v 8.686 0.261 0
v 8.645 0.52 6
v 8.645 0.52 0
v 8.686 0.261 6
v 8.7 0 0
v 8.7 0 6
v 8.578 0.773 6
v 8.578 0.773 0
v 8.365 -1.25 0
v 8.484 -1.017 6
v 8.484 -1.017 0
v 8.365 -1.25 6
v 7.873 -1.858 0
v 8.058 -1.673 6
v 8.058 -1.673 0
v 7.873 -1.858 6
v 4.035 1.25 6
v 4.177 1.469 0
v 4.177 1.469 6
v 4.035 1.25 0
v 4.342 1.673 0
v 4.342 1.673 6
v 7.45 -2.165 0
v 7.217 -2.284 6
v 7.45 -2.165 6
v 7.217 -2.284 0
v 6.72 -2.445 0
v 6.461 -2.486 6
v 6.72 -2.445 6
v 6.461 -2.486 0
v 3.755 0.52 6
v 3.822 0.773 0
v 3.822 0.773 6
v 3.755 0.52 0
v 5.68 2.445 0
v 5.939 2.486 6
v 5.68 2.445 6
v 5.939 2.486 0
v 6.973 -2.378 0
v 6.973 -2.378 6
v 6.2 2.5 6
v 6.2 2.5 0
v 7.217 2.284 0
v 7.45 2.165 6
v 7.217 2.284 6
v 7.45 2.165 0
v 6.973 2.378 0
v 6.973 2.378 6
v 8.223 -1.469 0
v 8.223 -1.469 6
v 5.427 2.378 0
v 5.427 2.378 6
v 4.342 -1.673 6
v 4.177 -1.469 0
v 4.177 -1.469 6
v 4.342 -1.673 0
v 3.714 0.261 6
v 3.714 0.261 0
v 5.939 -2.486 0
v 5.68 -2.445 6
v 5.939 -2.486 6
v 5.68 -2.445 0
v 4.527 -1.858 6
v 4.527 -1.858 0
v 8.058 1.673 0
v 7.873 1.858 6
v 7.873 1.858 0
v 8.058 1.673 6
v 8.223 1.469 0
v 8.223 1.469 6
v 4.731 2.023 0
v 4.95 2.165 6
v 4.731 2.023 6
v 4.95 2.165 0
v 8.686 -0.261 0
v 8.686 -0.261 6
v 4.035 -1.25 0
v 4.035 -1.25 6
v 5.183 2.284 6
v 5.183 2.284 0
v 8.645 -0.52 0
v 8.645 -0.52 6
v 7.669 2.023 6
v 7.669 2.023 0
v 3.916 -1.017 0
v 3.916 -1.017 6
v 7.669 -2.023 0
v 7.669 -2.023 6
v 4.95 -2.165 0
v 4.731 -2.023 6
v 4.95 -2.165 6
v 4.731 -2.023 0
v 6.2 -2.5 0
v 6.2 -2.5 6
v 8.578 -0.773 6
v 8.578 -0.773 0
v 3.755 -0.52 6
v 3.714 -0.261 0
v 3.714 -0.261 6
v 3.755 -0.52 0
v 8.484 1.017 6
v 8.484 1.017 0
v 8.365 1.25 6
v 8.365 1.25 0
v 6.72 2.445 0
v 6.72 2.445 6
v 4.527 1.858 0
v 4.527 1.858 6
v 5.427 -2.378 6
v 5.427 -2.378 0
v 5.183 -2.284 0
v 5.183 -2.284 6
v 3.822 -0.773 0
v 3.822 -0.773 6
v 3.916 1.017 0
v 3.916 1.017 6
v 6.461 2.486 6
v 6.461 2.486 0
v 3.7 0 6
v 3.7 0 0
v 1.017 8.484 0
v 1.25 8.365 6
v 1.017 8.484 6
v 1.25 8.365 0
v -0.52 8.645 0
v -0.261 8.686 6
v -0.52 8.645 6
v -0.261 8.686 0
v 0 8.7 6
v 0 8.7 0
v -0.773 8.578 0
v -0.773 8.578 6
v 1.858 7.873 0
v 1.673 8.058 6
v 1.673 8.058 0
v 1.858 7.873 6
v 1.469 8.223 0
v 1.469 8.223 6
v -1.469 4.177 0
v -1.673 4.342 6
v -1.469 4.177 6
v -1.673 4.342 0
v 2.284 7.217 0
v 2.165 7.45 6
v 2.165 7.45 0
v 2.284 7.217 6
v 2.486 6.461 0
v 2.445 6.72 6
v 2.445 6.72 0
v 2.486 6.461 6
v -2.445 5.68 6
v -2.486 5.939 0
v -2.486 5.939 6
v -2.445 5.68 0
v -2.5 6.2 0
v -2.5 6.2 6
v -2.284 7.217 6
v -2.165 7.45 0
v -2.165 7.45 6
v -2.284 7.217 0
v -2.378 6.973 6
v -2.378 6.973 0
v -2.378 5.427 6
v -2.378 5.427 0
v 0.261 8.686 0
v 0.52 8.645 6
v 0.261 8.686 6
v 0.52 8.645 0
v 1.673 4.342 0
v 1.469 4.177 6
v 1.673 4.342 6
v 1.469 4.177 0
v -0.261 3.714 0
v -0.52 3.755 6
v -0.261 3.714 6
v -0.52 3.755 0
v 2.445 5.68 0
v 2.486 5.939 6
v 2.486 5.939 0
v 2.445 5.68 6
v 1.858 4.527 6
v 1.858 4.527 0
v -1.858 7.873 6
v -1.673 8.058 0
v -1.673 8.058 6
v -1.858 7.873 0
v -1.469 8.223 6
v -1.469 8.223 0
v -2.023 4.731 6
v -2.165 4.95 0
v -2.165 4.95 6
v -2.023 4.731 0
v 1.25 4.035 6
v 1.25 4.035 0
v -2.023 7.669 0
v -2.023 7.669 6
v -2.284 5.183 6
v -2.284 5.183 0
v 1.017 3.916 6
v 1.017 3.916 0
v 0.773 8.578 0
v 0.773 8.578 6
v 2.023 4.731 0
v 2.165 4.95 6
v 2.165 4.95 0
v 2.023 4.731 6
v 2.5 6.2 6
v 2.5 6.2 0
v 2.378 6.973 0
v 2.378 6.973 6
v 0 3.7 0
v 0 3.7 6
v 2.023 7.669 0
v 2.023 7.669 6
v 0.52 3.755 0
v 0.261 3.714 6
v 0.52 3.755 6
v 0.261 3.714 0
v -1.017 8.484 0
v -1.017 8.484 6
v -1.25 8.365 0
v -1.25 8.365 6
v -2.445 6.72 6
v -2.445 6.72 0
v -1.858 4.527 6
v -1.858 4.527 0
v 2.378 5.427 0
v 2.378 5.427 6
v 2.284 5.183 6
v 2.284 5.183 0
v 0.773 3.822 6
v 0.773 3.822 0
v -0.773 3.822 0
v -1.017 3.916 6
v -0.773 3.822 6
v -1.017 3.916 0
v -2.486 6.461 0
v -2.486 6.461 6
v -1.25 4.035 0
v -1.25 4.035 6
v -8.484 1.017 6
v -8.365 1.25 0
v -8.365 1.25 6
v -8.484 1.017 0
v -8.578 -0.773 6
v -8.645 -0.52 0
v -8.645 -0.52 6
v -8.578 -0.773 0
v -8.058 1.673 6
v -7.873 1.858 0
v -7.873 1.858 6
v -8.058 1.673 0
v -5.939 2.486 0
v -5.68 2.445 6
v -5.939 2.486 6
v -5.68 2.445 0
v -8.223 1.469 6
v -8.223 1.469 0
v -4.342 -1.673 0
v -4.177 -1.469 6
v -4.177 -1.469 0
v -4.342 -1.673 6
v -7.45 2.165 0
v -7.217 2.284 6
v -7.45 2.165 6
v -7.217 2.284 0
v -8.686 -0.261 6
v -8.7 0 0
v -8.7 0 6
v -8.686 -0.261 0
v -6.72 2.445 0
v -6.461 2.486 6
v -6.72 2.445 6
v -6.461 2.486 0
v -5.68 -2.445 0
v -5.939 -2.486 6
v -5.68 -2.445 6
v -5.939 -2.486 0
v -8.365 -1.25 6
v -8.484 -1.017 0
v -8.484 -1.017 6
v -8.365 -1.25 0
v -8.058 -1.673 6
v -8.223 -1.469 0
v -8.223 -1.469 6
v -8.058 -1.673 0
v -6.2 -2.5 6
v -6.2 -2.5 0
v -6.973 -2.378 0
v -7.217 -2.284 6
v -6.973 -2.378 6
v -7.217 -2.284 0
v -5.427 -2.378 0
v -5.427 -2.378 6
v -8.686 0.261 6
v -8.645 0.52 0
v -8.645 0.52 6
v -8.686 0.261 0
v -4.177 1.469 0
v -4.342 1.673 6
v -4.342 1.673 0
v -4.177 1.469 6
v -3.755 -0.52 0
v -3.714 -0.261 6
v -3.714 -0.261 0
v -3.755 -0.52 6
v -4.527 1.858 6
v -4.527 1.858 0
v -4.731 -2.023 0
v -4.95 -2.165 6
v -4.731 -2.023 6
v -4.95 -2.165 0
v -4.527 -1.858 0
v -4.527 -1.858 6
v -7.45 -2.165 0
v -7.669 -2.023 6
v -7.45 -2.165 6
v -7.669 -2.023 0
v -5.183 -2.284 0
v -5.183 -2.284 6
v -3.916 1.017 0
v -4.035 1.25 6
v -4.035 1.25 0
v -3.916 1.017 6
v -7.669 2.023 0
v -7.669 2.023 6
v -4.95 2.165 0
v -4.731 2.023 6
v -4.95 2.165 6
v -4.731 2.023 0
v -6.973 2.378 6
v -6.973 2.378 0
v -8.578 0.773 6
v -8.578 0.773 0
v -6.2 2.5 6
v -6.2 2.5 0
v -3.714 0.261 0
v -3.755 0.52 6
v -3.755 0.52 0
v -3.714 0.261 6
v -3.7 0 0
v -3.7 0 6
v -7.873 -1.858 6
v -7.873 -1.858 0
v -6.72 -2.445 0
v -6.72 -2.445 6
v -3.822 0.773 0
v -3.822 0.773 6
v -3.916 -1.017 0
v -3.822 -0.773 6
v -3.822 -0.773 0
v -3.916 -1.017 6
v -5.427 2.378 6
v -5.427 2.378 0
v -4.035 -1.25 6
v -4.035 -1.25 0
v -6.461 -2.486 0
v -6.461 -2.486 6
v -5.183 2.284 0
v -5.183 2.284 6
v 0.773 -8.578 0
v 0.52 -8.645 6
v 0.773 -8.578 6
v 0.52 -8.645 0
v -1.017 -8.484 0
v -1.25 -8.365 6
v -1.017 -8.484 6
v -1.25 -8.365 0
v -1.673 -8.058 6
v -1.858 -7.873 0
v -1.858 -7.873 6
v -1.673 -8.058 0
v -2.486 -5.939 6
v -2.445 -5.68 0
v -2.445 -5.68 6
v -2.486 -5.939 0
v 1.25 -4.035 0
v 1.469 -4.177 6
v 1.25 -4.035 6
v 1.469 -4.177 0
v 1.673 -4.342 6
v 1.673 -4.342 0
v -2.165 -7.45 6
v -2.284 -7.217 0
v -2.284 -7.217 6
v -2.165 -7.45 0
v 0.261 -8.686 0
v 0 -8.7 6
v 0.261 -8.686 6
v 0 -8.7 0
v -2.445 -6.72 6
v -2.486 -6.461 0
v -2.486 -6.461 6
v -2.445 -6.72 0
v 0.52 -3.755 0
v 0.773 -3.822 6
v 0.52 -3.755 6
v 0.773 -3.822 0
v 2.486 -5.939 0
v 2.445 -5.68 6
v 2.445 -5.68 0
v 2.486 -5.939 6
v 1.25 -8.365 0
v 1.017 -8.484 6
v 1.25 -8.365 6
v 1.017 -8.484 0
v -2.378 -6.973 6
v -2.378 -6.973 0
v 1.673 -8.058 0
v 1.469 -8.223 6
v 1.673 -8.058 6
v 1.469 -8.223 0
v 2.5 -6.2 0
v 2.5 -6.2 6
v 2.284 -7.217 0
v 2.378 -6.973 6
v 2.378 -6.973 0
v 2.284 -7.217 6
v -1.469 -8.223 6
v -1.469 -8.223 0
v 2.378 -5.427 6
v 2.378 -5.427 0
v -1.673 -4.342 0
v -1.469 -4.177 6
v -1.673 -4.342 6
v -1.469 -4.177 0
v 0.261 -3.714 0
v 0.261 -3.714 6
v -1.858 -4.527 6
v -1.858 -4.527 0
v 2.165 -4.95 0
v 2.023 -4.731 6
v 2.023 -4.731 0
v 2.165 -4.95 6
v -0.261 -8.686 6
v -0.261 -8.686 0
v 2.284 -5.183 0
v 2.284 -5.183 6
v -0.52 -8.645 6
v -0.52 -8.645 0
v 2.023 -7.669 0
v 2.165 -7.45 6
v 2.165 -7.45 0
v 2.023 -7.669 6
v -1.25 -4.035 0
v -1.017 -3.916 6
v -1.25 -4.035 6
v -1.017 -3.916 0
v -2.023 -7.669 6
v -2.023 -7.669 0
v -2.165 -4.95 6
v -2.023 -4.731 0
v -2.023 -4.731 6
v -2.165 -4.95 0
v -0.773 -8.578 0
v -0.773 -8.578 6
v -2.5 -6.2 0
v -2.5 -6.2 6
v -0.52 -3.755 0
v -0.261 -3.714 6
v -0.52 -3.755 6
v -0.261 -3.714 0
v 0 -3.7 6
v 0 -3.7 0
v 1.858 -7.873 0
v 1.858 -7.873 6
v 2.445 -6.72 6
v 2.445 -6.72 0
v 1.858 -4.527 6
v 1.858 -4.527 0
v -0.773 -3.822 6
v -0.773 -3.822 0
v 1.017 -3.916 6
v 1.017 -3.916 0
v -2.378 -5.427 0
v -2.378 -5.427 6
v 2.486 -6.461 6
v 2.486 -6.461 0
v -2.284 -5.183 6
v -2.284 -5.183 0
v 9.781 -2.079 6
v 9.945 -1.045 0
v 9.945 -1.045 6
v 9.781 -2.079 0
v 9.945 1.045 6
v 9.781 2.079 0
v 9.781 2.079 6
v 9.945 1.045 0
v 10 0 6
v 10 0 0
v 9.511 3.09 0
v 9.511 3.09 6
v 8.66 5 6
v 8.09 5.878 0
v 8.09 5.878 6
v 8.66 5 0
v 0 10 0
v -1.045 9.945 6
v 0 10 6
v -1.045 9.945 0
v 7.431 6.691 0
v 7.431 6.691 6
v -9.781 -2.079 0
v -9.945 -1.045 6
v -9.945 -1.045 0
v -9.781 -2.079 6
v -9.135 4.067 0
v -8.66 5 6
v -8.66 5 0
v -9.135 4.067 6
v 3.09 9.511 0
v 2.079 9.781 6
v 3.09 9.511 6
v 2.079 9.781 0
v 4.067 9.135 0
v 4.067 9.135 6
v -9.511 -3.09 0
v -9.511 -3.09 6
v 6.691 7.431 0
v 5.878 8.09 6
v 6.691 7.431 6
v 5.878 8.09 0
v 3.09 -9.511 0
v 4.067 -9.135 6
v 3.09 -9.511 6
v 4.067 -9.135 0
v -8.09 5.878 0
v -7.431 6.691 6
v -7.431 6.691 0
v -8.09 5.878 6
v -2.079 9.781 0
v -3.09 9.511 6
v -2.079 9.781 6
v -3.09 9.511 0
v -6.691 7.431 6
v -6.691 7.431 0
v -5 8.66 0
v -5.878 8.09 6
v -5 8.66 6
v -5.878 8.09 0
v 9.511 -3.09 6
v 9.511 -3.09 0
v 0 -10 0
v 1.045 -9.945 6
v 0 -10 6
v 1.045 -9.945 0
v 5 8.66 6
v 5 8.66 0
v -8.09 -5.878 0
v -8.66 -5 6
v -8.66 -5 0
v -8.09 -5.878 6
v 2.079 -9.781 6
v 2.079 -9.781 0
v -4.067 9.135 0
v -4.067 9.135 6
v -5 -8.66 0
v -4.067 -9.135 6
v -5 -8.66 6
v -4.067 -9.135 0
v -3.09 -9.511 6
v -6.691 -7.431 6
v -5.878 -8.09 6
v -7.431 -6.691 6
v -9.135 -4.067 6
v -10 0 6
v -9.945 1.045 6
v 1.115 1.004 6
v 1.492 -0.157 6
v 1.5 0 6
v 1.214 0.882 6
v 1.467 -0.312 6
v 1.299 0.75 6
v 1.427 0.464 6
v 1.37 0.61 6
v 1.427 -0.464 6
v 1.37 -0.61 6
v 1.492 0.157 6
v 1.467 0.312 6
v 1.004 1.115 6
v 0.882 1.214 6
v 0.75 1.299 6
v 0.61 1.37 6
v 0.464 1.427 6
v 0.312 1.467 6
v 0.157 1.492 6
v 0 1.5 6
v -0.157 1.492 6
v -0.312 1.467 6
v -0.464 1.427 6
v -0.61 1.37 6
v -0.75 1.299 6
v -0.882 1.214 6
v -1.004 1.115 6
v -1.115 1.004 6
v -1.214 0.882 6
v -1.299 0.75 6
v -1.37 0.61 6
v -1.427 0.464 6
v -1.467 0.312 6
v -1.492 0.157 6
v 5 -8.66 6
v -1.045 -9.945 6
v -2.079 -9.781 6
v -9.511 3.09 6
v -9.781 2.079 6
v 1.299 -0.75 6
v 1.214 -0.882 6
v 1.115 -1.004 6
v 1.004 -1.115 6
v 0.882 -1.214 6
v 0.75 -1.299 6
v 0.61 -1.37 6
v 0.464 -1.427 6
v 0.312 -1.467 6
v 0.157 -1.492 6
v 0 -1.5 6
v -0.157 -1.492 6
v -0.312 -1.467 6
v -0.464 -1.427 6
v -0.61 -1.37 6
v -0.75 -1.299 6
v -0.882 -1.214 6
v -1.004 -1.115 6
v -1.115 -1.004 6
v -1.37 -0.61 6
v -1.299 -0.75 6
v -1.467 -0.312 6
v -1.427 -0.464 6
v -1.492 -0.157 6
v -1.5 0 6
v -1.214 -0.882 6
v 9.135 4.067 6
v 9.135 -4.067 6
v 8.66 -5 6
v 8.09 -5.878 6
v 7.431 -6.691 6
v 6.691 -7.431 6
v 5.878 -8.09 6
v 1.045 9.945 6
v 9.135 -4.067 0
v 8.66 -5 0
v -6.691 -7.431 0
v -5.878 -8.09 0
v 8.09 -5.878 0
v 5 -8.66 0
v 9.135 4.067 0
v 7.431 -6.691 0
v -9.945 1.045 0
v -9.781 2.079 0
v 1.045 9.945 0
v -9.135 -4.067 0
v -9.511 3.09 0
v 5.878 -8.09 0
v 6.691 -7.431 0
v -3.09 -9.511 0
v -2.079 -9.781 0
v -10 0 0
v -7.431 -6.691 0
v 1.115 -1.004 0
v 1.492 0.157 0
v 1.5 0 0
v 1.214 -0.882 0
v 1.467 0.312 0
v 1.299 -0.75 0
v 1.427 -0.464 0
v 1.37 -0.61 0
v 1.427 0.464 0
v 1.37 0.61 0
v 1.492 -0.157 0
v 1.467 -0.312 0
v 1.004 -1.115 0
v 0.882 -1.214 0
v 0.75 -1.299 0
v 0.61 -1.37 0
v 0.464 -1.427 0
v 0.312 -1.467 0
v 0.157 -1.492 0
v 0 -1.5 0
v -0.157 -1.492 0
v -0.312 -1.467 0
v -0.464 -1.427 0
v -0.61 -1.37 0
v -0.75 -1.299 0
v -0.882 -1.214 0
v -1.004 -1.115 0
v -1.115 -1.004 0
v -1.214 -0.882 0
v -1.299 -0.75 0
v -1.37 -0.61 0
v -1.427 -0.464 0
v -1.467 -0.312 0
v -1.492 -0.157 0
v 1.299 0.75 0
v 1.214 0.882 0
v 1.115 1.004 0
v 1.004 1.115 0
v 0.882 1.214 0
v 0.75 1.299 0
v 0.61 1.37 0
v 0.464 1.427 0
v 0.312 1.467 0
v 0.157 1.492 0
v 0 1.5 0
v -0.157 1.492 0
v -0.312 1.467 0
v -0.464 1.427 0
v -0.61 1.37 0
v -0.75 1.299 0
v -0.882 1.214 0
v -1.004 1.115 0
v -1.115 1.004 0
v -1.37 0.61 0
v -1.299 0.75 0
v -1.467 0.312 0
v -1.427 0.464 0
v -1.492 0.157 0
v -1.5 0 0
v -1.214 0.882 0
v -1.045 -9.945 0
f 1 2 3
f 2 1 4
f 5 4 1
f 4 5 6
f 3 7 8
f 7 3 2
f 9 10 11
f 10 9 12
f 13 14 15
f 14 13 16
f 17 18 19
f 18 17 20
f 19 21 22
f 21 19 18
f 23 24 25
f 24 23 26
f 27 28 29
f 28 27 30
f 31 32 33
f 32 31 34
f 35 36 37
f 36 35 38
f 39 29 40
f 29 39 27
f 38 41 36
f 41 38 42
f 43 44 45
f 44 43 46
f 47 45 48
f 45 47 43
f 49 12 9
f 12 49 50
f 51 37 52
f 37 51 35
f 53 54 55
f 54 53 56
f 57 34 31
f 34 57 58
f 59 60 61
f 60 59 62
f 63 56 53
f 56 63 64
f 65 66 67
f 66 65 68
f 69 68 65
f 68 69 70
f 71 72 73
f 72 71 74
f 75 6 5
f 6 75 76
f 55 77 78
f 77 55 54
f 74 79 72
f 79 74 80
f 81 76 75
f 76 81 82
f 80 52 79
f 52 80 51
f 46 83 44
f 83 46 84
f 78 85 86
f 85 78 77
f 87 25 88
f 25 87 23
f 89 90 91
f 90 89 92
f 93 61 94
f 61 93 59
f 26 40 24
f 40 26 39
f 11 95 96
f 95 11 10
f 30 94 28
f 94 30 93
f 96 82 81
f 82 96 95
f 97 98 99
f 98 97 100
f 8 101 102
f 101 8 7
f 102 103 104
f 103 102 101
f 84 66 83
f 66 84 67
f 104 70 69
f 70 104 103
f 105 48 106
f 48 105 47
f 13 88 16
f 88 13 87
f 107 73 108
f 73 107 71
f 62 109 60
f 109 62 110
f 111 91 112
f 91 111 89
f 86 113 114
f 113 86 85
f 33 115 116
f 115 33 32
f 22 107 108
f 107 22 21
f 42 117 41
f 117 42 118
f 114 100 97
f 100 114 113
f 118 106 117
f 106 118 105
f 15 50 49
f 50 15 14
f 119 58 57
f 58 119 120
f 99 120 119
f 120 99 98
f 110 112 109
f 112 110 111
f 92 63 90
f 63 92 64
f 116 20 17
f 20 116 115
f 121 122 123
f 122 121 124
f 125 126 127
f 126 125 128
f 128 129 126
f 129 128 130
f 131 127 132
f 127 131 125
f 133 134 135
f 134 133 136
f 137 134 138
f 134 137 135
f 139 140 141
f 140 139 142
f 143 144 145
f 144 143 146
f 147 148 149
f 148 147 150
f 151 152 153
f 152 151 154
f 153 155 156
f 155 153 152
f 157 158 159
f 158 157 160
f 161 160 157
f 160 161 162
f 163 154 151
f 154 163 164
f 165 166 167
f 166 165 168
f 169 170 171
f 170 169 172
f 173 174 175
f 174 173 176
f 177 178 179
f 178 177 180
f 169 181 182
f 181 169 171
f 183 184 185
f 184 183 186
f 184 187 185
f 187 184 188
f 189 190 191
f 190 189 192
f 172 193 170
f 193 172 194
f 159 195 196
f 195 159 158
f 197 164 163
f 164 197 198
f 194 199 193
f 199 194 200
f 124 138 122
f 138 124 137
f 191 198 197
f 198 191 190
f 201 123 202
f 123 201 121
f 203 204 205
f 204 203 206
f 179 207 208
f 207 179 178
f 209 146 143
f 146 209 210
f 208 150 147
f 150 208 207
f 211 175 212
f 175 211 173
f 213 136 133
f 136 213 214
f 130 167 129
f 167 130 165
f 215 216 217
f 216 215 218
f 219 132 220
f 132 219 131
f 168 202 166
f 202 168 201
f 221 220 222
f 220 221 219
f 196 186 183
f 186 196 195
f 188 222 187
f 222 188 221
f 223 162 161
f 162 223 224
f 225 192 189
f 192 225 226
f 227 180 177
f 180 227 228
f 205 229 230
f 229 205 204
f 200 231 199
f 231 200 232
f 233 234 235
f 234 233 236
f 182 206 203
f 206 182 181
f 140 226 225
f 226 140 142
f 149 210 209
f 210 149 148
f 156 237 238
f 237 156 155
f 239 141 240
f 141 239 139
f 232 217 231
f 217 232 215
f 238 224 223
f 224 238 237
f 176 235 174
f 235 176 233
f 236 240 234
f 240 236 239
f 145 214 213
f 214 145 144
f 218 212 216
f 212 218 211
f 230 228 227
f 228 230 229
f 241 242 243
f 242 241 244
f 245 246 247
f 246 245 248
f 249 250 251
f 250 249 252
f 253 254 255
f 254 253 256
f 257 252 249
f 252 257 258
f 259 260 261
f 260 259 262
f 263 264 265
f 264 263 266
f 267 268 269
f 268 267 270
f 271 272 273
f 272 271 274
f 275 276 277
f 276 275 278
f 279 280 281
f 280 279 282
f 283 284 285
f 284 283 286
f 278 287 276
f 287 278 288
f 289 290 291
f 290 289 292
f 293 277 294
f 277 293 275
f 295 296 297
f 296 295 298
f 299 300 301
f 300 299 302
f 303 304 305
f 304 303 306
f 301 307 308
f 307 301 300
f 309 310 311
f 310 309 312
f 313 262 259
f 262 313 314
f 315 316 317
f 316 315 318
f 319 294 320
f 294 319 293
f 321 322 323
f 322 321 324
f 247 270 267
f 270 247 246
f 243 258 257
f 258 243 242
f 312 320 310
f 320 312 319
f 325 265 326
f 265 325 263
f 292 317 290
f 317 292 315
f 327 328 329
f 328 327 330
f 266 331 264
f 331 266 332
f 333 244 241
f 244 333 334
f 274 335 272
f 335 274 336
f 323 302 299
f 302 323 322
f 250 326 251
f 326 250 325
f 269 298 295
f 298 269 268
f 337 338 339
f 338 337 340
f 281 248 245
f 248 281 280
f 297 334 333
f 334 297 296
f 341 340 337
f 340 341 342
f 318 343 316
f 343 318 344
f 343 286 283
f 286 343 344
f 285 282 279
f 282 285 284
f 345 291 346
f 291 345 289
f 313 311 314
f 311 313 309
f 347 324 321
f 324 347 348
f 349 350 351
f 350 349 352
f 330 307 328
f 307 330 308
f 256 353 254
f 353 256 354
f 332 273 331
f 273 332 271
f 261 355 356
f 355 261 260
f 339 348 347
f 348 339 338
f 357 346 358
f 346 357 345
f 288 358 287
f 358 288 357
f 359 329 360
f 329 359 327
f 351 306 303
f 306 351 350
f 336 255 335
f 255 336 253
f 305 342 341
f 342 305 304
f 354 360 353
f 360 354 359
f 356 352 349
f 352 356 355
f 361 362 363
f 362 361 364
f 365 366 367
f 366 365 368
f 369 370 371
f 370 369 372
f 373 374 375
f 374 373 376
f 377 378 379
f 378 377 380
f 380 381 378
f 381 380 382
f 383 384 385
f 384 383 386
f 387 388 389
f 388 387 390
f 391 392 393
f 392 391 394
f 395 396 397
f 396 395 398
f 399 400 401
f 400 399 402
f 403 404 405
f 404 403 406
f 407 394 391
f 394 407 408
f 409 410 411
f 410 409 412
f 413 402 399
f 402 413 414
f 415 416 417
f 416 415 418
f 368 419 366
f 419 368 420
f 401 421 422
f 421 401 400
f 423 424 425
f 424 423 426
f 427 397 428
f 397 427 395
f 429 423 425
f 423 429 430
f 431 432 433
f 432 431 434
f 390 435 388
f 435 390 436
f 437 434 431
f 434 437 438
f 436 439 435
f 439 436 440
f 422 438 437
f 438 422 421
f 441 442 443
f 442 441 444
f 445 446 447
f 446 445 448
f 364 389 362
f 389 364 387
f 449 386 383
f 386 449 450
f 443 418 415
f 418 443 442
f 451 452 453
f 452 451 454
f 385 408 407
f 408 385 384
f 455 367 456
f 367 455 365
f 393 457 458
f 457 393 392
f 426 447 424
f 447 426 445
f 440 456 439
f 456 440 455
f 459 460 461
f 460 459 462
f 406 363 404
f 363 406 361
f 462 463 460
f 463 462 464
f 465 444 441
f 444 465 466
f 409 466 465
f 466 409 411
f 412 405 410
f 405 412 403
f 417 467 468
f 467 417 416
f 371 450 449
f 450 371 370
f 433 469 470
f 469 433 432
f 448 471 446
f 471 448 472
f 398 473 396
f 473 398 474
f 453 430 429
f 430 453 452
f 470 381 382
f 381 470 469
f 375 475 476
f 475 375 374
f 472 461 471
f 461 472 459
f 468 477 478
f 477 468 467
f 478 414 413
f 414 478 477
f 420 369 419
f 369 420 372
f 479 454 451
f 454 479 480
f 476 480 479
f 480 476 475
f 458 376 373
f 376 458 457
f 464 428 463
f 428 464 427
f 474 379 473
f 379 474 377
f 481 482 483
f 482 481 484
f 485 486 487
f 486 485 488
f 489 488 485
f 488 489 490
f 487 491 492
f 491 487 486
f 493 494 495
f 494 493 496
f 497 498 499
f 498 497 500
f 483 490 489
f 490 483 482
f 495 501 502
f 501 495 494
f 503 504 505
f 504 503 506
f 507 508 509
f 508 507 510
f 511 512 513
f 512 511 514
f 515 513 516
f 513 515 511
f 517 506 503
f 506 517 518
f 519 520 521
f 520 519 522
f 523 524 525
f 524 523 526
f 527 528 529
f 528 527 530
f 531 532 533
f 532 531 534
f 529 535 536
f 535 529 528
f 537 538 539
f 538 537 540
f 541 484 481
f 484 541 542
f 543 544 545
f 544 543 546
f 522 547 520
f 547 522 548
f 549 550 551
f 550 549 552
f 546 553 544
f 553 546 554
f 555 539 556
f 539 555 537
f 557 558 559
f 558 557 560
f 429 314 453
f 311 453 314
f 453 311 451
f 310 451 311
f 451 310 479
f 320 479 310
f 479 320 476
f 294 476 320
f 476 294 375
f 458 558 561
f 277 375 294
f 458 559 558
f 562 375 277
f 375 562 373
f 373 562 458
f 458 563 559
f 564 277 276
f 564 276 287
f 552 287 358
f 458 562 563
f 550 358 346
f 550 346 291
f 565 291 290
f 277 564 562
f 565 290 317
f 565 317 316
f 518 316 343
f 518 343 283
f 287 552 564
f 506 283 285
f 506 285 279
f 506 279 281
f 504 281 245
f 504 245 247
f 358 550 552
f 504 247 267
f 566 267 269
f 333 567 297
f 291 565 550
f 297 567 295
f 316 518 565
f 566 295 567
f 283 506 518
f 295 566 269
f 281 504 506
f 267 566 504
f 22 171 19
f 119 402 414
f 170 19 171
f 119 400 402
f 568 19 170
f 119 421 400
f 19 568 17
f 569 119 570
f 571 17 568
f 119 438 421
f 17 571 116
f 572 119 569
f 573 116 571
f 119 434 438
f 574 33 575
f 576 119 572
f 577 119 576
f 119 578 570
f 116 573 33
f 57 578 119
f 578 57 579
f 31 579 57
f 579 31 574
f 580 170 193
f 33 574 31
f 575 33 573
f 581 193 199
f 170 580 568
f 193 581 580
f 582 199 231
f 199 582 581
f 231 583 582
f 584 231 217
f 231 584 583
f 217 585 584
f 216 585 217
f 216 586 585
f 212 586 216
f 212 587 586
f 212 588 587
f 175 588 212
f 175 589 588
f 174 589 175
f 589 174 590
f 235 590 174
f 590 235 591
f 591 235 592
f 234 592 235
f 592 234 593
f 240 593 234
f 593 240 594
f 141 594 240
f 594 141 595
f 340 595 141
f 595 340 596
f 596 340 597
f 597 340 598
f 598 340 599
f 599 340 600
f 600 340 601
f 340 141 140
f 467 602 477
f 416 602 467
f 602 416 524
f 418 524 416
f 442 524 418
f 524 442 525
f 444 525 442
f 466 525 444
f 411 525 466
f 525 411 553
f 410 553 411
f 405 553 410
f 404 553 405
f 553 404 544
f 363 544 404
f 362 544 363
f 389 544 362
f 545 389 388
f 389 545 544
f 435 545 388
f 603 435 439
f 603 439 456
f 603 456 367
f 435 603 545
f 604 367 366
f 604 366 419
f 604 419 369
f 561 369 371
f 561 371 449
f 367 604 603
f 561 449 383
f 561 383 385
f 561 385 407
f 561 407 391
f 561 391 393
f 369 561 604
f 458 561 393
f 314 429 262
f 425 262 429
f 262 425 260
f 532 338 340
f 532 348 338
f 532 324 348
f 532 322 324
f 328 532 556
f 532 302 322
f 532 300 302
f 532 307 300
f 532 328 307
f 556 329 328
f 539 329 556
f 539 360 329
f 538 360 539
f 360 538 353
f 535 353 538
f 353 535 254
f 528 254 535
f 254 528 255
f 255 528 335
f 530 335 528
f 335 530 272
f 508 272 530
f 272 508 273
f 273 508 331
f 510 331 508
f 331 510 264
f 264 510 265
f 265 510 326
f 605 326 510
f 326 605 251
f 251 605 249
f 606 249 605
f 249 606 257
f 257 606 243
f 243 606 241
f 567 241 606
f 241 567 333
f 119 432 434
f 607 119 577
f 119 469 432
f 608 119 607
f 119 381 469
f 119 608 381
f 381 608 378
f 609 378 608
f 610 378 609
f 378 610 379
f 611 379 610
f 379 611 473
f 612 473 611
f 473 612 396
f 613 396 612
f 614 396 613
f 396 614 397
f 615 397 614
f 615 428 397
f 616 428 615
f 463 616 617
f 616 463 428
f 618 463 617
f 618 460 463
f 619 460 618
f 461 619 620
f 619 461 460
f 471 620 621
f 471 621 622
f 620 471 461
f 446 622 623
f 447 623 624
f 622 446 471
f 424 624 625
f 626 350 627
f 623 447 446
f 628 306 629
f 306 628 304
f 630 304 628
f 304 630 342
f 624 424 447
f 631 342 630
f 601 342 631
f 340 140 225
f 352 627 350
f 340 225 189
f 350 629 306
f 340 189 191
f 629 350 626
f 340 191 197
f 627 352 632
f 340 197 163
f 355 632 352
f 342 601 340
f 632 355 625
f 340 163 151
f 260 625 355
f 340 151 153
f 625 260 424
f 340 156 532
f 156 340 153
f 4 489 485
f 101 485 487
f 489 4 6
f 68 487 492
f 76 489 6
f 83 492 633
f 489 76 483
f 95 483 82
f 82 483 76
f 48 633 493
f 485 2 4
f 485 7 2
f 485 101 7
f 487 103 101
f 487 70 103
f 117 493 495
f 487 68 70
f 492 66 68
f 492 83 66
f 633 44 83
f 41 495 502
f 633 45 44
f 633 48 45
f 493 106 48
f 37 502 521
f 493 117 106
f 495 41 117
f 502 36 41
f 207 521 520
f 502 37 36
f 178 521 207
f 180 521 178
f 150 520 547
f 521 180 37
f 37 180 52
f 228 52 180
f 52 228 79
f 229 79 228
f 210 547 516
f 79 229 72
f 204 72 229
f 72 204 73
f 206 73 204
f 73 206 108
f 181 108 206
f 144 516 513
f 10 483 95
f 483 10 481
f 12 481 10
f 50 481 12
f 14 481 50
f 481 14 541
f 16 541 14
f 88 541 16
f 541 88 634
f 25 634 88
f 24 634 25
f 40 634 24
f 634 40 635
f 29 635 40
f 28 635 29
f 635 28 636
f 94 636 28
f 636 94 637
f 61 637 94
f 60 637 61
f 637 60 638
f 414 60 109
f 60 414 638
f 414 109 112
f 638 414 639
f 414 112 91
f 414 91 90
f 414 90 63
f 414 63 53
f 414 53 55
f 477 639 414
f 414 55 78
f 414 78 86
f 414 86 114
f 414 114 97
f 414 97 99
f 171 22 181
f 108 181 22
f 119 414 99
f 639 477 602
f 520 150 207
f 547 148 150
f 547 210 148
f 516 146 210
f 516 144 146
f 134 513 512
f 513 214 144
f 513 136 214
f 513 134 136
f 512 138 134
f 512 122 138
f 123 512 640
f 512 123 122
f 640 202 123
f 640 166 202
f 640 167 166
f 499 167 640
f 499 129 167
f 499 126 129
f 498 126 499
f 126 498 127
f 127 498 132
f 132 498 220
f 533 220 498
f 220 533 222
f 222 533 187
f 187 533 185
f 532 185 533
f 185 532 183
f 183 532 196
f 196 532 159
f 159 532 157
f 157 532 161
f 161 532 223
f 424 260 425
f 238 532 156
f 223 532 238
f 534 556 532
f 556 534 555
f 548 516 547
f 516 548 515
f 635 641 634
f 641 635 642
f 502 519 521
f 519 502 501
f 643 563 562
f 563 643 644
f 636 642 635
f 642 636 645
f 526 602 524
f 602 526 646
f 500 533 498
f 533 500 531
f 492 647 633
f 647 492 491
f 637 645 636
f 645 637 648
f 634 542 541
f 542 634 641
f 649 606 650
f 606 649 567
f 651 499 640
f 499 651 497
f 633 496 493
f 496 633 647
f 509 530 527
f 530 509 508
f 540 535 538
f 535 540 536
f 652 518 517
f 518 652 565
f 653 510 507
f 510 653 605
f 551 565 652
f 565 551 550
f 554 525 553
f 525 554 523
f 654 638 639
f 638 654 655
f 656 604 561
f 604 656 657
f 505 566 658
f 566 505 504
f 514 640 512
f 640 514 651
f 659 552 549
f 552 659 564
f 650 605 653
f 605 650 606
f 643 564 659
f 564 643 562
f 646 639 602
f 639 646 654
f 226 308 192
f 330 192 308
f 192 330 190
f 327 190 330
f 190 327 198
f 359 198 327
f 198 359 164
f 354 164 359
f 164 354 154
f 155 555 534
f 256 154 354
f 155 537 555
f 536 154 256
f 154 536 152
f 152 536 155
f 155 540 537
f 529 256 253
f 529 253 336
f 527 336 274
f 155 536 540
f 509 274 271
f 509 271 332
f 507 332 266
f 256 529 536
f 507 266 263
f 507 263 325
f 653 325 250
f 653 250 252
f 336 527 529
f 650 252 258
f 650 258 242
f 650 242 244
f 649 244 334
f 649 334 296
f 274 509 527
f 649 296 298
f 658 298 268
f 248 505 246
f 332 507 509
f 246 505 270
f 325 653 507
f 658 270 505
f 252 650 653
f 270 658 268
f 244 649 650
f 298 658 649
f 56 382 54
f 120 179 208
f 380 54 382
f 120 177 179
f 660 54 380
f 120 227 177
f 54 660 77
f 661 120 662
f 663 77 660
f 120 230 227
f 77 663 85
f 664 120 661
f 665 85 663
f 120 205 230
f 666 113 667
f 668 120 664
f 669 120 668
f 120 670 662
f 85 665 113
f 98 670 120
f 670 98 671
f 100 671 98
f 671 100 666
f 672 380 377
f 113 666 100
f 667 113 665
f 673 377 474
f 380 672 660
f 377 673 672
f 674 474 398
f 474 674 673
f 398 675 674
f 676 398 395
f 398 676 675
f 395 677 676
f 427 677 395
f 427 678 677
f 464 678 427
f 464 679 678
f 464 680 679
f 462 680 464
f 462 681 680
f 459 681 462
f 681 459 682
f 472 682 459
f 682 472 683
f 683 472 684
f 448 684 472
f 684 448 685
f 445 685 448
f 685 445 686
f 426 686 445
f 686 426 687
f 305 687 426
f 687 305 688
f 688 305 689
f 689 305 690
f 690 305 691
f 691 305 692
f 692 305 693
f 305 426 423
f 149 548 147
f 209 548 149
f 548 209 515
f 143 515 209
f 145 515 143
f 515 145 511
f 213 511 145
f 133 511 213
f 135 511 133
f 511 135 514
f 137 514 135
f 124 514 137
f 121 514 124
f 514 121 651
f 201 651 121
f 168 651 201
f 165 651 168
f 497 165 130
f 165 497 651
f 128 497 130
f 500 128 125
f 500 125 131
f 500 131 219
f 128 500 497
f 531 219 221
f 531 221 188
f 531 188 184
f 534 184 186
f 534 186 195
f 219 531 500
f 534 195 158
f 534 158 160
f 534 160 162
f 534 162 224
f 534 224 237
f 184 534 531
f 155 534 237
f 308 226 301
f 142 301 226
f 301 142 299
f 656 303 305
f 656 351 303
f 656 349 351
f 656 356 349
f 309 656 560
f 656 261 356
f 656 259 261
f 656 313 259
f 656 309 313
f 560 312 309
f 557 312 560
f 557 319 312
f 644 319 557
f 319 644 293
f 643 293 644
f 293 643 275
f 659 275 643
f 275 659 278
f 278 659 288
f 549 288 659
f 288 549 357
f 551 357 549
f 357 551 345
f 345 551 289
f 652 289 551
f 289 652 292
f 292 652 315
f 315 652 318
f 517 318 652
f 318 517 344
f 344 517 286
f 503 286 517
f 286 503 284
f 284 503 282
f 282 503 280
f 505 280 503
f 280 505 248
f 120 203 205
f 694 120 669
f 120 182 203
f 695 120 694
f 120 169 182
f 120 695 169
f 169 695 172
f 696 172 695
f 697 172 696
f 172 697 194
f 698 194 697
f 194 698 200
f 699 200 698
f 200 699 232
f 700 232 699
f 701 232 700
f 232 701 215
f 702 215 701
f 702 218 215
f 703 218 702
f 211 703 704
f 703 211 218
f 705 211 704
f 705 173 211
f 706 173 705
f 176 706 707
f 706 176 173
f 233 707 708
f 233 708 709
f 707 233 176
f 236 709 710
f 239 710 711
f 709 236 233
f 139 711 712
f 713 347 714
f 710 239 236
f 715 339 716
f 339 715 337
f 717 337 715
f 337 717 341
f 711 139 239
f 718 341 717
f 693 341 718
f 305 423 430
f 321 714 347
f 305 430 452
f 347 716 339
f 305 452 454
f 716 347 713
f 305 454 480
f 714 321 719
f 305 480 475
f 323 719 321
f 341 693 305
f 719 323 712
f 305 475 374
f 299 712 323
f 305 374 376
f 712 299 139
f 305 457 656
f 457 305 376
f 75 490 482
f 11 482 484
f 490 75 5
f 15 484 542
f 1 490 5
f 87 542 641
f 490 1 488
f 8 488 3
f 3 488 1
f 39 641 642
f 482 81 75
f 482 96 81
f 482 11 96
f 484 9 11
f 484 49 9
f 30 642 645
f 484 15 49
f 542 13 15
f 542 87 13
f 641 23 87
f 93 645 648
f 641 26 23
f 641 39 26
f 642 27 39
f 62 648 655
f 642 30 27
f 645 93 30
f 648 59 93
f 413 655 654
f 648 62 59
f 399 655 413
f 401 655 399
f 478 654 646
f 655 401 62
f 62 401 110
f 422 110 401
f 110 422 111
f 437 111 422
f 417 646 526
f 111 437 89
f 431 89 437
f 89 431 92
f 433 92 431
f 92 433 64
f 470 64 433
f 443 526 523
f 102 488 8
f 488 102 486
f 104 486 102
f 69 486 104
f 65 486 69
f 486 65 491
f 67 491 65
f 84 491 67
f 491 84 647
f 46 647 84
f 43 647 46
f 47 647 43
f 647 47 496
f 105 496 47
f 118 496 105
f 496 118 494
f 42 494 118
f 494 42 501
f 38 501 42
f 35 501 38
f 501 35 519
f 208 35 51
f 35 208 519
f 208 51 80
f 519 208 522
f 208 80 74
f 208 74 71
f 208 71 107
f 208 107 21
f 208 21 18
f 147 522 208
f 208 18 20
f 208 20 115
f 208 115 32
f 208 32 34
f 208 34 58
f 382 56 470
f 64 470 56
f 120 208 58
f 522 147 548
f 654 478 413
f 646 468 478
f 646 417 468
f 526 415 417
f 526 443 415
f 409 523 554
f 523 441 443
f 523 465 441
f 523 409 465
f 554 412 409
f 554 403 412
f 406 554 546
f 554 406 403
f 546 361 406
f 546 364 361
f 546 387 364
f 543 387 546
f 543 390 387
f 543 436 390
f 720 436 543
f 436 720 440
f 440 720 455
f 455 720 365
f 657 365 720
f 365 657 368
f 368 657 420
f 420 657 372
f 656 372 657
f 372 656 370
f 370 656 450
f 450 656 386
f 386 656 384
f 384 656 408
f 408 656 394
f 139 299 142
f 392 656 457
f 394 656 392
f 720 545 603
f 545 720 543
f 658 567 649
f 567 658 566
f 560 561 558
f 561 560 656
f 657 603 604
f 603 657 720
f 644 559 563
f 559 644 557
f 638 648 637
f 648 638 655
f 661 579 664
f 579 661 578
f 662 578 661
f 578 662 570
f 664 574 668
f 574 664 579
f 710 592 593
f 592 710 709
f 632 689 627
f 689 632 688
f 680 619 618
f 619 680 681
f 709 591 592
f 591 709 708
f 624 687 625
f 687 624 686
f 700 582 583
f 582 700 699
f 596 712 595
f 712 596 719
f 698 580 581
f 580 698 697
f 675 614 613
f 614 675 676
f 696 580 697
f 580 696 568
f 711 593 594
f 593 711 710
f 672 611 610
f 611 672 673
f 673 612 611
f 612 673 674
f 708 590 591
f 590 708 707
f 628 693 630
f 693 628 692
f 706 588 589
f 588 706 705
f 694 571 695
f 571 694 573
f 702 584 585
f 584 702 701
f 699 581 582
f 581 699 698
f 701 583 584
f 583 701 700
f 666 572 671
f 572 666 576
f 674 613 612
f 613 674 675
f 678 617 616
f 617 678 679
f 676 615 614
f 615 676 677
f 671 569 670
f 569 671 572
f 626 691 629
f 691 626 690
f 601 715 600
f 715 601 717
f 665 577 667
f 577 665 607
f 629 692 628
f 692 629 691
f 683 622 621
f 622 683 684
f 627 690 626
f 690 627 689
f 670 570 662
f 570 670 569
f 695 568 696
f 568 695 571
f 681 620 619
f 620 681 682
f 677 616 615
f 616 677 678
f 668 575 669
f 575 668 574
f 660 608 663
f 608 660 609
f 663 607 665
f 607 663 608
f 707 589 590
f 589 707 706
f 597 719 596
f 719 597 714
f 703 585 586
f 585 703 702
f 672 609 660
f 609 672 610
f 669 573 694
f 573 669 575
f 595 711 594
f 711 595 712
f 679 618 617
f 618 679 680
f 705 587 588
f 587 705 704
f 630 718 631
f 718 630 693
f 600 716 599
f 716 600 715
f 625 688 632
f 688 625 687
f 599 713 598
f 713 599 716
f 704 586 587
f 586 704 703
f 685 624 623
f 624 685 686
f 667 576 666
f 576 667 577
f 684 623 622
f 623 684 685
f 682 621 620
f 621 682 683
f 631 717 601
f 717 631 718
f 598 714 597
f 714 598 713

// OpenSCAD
// Lightweight sprocket blank.
$fn = 60;
eps = 0.02;
bore_d = 3;
outer_d = 20;
spoke_holes = 4;
thickness = 6;
difference() { cylinder(d=outer_d,h=thickness); translate([0,0,-eps]) cylinder(d=bore_d,h=thickness+2*eps); for(i=[0:spoke_holes-1]) rotate([0,0,i*360/spoke_holes]) translate([outer_d*0.31,0,-eps]) cylinder(d=5,h=thickness+2*eps); }
